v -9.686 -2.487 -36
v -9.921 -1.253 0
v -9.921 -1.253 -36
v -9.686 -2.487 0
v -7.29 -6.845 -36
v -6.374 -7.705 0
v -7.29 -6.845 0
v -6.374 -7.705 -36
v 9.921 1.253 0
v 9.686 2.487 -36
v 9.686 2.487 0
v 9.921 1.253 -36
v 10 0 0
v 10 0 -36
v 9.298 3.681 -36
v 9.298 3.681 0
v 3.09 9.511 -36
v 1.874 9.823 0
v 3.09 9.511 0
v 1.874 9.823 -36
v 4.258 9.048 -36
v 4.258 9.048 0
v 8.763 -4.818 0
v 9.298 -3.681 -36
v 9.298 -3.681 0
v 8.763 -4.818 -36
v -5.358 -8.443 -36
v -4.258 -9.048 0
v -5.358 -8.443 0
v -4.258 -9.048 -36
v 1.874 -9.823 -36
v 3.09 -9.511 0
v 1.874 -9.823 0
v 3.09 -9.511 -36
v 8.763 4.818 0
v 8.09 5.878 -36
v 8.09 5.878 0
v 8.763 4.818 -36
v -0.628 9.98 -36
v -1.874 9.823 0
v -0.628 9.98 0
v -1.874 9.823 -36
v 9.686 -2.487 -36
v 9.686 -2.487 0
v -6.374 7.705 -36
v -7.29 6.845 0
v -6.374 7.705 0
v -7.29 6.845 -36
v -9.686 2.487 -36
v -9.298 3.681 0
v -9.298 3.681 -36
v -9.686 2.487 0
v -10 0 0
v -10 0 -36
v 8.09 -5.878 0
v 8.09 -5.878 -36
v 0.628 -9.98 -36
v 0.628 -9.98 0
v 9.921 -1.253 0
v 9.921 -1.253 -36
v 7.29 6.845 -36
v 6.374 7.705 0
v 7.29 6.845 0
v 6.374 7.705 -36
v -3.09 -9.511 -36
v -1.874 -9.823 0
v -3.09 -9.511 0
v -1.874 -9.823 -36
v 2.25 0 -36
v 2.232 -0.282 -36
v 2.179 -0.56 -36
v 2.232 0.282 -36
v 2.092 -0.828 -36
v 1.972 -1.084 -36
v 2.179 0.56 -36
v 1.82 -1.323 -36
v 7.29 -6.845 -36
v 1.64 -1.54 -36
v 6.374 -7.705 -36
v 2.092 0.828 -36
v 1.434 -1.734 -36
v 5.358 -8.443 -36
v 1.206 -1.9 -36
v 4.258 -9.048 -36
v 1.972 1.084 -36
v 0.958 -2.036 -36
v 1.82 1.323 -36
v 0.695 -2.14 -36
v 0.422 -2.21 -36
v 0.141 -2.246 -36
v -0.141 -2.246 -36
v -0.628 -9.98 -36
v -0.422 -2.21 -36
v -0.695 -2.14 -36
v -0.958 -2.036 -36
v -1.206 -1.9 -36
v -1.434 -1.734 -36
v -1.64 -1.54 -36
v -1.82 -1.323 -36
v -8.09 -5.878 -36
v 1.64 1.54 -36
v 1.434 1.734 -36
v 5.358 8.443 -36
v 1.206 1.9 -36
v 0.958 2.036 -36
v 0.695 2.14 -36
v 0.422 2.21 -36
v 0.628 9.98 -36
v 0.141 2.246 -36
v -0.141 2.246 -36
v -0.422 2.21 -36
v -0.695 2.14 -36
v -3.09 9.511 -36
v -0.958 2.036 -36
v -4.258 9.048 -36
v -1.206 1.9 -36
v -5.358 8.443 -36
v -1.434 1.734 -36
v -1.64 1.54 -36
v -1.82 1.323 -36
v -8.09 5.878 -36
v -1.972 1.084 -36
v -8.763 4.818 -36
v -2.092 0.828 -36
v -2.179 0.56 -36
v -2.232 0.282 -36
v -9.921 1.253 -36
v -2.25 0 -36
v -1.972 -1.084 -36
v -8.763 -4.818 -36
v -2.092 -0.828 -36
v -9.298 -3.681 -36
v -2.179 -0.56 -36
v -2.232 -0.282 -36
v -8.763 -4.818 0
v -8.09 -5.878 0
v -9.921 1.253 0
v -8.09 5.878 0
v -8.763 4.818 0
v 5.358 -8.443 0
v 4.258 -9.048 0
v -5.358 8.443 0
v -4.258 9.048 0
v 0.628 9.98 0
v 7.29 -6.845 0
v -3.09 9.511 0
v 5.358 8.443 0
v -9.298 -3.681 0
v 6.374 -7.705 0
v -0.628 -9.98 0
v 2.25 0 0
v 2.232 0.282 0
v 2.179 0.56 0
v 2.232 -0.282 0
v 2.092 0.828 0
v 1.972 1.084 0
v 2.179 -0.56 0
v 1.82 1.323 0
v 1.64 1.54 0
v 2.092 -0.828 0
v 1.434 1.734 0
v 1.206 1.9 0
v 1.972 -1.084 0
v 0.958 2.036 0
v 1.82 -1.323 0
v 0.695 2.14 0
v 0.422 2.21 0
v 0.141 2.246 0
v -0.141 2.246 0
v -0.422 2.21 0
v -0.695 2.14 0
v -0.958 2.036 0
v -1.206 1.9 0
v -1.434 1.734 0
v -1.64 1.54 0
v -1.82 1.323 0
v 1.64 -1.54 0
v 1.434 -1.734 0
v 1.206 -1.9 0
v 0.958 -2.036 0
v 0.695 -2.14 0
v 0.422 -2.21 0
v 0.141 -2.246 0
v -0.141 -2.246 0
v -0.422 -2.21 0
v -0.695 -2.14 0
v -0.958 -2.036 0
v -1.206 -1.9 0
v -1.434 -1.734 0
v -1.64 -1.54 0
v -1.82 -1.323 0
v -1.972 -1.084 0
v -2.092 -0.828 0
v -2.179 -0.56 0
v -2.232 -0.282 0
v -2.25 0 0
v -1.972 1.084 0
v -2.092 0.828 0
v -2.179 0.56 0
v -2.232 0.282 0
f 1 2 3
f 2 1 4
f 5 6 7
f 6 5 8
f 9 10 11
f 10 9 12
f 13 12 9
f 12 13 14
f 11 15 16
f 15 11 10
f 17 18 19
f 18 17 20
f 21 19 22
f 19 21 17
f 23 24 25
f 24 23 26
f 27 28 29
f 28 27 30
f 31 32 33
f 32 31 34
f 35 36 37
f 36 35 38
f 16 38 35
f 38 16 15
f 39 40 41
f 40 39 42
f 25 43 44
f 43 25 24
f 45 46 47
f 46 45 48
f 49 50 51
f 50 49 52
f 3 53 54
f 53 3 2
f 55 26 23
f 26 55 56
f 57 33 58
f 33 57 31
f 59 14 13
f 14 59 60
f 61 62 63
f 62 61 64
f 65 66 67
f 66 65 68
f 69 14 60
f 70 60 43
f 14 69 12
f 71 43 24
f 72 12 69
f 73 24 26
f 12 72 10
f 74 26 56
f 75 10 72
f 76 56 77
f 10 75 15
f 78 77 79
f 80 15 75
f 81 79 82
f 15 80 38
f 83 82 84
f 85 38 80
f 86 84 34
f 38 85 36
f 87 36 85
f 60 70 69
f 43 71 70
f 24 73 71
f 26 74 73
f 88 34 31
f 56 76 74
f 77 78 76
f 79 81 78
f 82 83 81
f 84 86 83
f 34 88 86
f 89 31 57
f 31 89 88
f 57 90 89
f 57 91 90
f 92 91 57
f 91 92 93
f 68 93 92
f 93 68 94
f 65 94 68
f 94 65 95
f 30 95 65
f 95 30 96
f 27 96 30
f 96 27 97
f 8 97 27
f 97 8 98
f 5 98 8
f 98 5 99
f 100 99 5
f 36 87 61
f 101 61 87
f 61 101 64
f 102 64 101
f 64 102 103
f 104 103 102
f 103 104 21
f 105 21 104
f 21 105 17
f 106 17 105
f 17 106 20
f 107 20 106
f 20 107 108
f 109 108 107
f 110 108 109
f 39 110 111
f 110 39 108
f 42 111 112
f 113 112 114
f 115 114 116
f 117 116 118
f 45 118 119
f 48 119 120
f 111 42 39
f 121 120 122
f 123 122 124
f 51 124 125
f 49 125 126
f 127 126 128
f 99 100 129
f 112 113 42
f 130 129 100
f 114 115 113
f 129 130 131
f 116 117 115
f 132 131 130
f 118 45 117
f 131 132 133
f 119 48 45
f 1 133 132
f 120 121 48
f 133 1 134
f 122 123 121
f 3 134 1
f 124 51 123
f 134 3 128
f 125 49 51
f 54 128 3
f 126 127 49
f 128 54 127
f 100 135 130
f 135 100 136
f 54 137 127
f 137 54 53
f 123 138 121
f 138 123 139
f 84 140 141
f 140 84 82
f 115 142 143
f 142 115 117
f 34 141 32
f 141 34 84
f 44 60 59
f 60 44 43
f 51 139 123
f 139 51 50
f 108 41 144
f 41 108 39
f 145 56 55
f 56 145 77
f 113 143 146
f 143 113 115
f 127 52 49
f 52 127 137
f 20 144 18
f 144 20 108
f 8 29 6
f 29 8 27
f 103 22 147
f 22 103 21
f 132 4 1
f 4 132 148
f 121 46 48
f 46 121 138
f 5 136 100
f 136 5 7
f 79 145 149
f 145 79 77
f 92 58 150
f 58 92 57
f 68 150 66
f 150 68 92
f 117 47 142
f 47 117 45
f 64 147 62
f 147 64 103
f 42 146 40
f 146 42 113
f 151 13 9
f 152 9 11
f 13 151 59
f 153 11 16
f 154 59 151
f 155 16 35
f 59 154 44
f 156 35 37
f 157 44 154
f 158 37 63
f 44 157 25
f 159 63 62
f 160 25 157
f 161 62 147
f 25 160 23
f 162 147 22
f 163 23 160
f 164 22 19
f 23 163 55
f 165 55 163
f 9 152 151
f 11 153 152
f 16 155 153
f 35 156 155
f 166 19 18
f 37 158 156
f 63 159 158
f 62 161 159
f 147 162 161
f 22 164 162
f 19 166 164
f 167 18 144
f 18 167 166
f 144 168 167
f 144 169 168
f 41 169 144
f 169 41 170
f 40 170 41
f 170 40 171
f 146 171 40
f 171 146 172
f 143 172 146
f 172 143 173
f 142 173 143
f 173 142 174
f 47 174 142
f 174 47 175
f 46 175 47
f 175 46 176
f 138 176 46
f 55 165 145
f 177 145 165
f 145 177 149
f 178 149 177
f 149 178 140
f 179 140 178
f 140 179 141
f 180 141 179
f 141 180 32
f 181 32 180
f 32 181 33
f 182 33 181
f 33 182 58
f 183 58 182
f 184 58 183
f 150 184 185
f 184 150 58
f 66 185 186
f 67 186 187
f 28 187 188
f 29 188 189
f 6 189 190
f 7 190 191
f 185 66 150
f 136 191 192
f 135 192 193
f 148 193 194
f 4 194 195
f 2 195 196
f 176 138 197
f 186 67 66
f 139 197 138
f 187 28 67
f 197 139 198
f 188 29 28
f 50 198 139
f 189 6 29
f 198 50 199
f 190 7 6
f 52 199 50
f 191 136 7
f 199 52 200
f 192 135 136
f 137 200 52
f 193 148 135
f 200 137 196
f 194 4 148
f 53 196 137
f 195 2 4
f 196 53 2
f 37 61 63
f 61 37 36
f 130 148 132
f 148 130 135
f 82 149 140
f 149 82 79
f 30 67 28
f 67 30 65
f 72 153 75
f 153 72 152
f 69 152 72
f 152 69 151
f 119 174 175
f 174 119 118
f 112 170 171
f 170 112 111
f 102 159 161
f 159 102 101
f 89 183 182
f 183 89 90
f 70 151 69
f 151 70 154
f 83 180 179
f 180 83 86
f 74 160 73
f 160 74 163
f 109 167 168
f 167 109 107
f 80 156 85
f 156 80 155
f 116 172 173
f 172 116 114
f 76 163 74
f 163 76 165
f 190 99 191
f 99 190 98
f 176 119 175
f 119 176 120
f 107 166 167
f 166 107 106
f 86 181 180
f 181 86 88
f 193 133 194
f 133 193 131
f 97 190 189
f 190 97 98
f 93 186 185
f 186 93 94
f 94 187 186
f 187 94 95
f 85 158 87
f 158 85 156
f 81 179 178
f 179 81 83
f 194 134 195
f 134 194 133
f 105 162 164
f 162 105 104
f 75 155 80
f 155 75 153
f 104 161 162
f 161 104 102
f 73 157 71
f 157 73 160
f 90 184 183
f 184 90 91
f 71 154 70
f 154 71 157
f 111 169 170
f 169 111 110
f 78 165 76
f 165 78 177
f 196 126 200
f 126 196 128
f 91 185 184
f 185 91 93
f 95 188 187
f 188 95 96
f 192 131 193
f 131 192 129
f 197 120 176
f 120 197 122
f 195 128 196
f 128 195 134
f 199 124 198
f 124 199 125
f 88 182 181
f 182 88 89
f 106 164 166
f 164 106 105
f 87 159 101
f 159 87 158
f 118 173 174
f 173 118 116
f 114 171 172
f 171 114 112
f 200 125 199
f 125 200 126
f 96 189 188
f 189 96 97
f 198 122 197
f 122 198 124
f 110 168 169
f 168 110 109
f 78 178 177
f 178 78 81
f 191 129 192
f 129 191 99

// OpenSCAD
$fn = 50;


difference() {
	union() {
		translate(v = [0, 0, -36.0000000000]) {
			cylinder(h = 36, r = 10.0000000000);
		}
	}
	union() {
		#translate(v = [0, 0, -36]) {
			cylinder(h = 36, r = 2.2500000000);
		}
	}
}
